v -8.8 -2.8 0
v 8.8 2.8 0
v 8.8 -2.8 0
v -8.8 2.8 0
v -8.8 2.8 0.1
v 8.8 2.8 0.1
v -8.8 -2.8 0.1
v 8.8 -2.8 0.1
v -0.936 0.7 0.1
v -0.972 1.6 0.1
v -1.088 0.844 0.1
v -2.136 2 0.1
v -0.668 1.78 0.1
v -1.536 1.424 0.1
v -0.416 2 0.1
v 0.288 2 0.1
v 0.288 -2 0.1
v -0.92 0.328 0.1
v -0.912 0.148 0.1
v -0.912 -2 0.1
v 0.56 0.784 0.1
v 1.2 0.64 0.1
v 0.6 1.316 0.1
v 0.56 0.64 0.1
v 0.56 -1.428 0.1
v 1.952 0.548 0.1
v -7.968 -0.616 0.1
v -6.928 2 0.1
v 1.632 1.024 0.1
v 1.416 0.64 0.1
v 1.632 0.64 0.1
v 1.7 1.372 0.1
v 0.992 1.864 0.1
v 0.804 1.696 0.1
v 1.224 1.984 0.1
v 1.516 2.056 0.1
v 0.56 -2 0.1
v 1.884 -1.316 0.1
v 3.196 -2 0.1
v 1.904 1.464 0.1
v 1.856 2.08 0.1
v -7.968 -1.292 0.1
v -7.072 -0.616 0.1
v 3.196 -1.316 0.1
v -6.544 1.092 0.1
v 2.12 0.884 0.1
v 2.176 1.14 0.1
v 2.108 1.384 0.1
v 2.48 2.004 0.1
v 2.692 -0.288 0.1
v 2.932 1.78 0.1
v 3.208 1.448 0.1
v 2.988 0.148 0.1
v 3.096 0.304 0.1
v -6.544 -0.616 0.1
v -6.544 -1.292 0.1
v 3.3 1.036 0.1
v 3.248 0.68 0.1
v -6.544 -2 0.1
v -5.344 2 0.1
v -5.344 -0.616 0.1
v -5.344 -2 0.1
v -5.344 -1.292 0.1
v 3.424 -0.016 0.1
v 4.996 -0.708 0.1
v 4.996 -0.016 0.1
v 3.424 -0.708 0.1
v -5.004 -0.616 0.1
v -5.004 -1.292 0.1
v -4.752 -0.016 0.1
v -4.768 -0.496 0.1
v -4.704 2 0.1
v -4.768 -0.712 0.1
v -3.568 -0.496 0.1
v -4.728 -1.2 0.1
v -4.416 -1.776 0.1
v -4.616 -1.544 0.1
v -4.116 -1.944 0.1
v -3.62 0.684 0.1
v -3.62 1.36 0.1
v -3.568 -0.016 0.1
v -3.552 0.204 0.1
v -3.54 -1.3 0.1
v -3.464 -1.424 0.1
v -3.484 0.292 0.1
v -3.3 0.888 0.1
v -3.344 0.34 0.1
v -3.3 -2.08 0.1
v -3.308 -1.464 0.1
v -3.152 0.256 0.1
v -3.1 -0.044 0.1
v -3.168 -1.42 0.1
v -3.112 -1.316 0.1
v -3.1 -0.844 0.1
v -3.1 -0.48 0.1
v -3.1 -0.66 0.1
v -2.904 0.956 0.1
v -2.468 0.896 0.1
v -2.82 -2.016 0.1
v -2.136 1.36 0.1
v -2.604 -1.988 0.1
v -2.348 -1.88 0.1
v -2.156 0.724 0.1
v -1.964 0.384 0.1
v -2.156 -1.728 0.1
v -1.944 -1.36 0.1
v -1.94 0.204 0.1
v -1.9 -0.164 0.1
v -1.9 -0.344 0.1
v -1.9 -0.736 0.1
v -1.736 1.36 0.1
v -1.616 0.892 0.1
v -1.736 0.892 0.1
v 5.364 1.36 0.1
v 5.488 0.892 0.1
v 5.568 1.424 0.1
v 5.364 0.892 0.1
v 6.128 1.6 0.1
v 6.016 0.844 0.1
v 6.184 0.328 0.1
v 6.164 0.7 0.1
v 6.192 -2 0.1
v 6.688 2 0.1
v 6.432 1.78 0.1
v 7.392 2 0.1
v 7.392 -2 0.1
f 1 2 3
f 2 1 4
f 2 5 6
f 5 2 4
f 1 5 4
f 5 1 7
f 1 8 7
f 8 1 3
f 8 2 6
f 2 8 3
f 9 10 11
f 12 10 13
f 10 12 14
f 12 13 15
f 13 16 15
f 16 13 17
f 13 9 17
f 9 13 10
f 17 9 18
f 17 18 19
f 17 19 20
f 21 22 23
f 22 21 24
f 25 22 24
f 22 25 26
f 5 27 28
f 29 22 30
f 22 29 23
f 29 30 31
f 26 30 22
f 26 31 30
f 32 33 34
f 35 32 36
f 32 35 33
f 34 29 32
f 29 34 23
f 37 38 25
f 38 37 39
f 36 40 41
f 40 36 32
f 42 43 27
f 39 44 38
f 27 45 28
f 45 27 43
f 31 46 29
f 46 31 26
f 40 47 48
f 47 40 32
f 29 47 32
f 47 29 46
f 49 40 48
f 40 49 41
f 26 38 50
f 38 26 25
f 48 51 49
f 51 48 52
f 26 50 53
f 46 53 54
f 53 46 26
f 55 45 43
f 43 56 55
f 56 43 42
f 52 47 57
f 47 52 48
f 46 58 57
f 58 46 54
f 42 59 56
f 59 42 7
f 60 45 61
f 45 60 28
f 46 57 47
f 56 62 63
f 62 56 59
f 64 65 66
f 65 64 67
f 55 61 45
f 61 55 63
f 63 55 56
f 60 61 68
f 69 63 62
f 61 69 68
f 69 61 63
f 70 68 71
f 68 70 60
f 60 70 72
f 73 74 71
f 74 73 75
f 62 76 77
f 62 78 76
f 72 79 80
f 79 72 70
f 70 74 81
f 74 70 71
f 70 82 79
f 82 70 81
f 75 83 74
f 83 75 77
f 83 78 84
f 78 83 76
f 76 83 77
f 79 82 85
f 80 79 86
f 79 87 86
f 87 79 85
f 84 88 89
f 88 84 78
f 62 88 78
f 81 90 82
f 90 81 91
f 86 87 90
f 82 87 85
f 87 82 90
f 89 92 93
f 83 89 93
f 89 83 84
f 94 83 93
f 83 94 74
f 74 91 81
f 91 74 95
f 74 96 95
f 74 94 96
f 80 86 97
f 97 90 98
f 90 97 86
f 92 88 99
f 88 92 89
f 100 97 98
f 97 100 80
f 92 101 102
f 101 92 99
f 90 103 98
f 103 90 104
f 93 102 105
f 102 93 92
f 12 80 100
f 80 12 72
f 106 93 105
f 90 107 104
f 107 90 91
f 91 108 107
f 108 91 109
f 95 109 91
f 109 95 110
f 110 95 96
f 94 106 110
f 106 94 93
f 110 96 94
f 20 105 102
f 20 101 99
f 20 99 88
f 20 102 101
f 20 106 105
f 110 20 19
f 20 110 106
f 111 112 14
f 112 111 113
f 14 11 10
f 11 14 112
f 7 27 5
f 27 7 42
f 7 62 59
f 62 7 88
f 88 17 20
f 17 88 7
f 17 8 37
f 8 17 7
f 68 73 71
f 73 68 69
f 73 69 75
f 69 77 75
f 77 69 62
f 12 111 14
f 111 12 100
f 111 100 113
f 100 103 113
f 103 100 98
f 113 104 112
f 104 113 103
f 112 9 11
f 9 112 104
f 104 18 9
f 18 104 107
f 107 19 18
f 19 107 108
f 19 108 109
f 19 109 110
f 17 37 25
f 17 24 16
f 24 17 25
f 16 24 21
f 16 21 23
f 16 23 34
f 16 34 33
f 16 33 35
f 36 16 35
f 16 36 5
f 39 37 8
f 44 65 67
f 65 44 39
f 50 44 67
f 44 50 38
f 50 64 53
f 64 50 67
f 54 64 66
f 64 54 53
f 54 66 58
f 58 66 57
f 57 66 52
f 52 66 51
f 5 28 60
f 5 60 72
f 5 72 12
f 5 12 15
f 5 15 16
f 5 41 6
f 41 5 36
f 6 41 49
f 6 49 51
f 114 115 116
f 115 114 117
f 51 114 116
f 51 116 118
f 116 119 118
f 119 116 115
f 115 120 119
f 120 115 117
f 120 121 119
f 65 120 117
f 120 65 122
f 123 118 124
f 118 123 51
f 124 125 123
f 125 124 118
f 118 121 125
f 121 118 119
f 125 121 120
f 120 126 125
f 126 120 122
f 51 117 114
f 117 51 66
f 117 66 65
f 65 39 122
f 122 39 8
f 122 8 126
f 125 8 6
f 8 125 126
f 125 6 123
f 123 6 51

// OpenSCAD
// file: ../p/box5-12.scad
use <../lib.scad>
function ldraw_lib__box5_12() = [
// 0 Box with 5 Faces without Any Edges
// 0 Name: box5-12.dat
// 0 Author: Chris Dee [cwdee]
// 0 !LDRAW_ORG Primitive UPDATE 2009-02
// 0 !LICENSE Licensed under CC BY 4.0 : see CAreadme.txt
// 
// 0 BFC CERTIFY CCW
  [0,"BFC","CERTIFY"],
  [0,"BFC","CCW"],
// 
// 0 !HISTORY 2009-09-03 [PTadmin] Official Update 2009-02
// 
// 
// 4 16 1 1 1 1 1 -1 -1 1 -1 -1 1 1
  [4,16,1,1,1,1,1,-1,-1,1,-1,-1,1,1],
// 4 16 -1 0 1 1 0 1 1 1 1 -1 1 1
  [4,16,-1,0,1,1,0,1,1,1,1,-1,1,1],
// 4 16 -1 0 -1 -1 0 1 -1 1 1 -1 1 -1
  [4,16,-1,0,-1,-1,0,1,-1,1,1,-1,1,-1],
// 4 16 1 0 -1 -1 0 -1 -1 1 -1 1 1 -1
  [4,16,1,0,-1,-1,0,-1,-1,1,-1,1,1,-1],
// 4 16 1 0 1 1 0 -1 1 1 -1 1 1 1
  [4,16,1,0,1,1,0,-1,1,1,-1,1,1,1],
// 0
];
module ldraw_lib__box5_12(step=0, col=false, unit=2/5, alt=false, line=0.2, solid=!$preview)
    makepoly(ldraw_lib__box5_12(), step=step, col=col, unit=unit, alt=alt, line=line, solid=solid);
ldraw_lib__box5_12(line=0.2);
// main file
use <../lib.scad>
use <s/4201639hs01.scad>
function ldraw_lib__4201639h() = [
// 0 Sticker  0.7 x  2.2 with White "4512-1" on Black Background
// 0 Name: 4201639h.dat
// 0 Author: Gerald Lasser [GeraldLasser]
// 0 !LDRAW_ORG Part UPDATE 2024-04
// 0 !LICENSE Licensed under CC BY 4.0 : see CAreadme.txt
// 
// 0 BFC CERTIFY CCW
  [0,"BFC","CERTIFY"],
  [0,"BFC","CCW"],
// 
// 0 !KEYWORDS Set 4512
// 
// 0 !HISTORY 2024-05-28 [OrionP] Official Update 2024-04
// 
// 
// 1 16 0 0 0 1 0 0 0 1 0 0 0 1 s\4201639hs01.dat
  [1,16,0,0,0,1,0,0,0,1,0,0,0,1, ldraw_lib__s__4201639hs01()],
// 
// 0 // Digit 1
// 4 15 13.92 -.25 3.56 13.41 -.25 3.4 13.41 -.25 2.23 13.72 -.25 2.23
  [4,15,13.92,-.25,3.56,13.41,-.25,3.4,13.41,-.25,2.23,13.72,-.25,2.23],
// 3 0 7.33 -.25 4.45 13.41 -.25 3.4 13.92 -.25 3.56
  [3,0,7.33,-.25,4.45,13.41,-.25,3.4,13.92,-.25,3.56],
// 3 0 7.33 -.25 4.45 13.92 -.25 3.56 15.32 -.25 4
  [3,0,7.33,-.25,4.45,13.92,-.25,3.56,15.32,-.25,4],
// 4 15 13.72 -.25 2.23 15.04 -.25 2.11 15.32 -.25 4 13.92 -.25 3.56
  [4,15,13.72,-.25,2.23,15.04,-.25,2.11,15.32,-.25,4,13.92,-.25,3.56],
// 4 0 13.41 -.25 2.23 15.46 -.25 .82 15.04 -.25 2.11 13.72 -.25 2.23
  [4,0,13.41,-.25,2.23,15.46,-.25,.82,15.04,-.25,2.11,13.72,-.25,2.23],
// 3 0 15.46 -.25 .82 15.41 -.25 1.75 15.04 -.25 2.11
  [3,0,15.46,-.25,.82,15.41,-.25,1.75,15.04,-.25,2.11],
// 4 0 12.49 -.25 -1.77 15.48 -.25 -5 15.46 -.25 .82 13.41 -.25 2.23
  [4,0,12.49,-.25,-1.77,15.48,-.25,-5,15.46,-.25,.82,13.41,-.25,2.23],
// 4 0 15.32 -.25 4 16.08 -.25 4.45 16.72 -.25 5 7.33 -.25 4.45
  [4,0,15.32,-.25,4,16.08,-.25,4.45,16.72,-.25,5,7.33,-.25,4.45],
// 3 15 16.08 -.25 4.45 18.48 -.25 5 16.72 -.25 5
  [3,15,16.08,-.25,4.45,18.48,-.25,5,16.72,-.25,5],
// 3 15 18.48 -.25 5 16.08 -.25 4.45 15.32 -.25 4
  [3,15,18.48,-.25,5,16.08,-.25,4.45,15.32,-.25,4],
// 4 15 15.04 -.25 2.11 15.41 -.25 1.75 18.48 -.25 5 15.32 -.25 4
  [4,15,15.04,-.25,2.11,15.41,-.25,1.75,18.48,-.25,5,15.32,-.25,4],
// 3 15 18.48 -.25 5 15.41 -.25 1.75 15.46 -.25 .82
  [3,15,18.48,-.25,5,15.41,-.25,1.75,15.46,-.25,.82],
// 4 15 18.48 -.25 -5 18.48 -.25 5 15.46 -.25 .82 15.48 -.25 -5
  [4,15,18.48,-.25,-5,18.48,-.25,5,15.46,-.25,.82,15.48,-.25,-5],
// 4 0 12.49 -.25 -.04 13.41 -.25 2.23 13.41 -.25 3.4 7.33 -.25 4.45
  [4,0,12.49,-.25,-.04,13.41,-.25,2.23,13.41,-.25,3.4,7.33,-.25,4.45],
// 3 0 13.41 -.25 2.23 12.49 -.25 -.04 12.49 -.25 -1.77
  [3,0,13.41,-.25,2.23,12.49,-.25,-.04,12.49,-.25,-1.77],
// 3 0 12.49 -.25 -1.77 7.99 -.25 -5 15.48 -.25 -5
  [3,0,12.49,-.25,-1.77,7.99,-.25,-5,15.48,-.25,-5],
// 3 0 15.48 -.25 -5 7.99 -.25 -5 22 -.25 -7
  [3,0,15.48,-.25,-5,7.99,-.25,-5,22,-.25,-7],
// 3 0 15.48 -.25 -5 22 -.25 -7 18.48 -.25 -5
  [3,0,15.48,-.25,-5,22,-.25,-7,18.48,-.25,-5],
// 4 0 22 -.25 7 18.48 -.25 5 18.48 -.25 -5 22 -.25 -7
  [4,0,22,-.25,7,18.48,-.25,5,18.48,-.25,-5,22,-.25,-7],
// 3 0 18.48 -.25 5 22 -.25 7 16.72 -.25 5
  [3,0,18.48,-.25,5,22,-.25,7,16.72,-.25,5],
// 3 0 16.72 -.25 5 22 -.25 7 7.33 -.25 4.45
  [3,0,16.72,-.25,5,22,-.25,7,7.33,-.25,4.45],
];
module ldraw_lib__4201639h(step=0, col=false, unit=2/5, alt=false, line=0.2, solid=!$preview)
    makepoly(ldraw_lib__4201639h(), step=step, col=col, unit=unit, alt=alt, line=line, solid=solid);
ldraw_lib__4201639h(line=0.2);
